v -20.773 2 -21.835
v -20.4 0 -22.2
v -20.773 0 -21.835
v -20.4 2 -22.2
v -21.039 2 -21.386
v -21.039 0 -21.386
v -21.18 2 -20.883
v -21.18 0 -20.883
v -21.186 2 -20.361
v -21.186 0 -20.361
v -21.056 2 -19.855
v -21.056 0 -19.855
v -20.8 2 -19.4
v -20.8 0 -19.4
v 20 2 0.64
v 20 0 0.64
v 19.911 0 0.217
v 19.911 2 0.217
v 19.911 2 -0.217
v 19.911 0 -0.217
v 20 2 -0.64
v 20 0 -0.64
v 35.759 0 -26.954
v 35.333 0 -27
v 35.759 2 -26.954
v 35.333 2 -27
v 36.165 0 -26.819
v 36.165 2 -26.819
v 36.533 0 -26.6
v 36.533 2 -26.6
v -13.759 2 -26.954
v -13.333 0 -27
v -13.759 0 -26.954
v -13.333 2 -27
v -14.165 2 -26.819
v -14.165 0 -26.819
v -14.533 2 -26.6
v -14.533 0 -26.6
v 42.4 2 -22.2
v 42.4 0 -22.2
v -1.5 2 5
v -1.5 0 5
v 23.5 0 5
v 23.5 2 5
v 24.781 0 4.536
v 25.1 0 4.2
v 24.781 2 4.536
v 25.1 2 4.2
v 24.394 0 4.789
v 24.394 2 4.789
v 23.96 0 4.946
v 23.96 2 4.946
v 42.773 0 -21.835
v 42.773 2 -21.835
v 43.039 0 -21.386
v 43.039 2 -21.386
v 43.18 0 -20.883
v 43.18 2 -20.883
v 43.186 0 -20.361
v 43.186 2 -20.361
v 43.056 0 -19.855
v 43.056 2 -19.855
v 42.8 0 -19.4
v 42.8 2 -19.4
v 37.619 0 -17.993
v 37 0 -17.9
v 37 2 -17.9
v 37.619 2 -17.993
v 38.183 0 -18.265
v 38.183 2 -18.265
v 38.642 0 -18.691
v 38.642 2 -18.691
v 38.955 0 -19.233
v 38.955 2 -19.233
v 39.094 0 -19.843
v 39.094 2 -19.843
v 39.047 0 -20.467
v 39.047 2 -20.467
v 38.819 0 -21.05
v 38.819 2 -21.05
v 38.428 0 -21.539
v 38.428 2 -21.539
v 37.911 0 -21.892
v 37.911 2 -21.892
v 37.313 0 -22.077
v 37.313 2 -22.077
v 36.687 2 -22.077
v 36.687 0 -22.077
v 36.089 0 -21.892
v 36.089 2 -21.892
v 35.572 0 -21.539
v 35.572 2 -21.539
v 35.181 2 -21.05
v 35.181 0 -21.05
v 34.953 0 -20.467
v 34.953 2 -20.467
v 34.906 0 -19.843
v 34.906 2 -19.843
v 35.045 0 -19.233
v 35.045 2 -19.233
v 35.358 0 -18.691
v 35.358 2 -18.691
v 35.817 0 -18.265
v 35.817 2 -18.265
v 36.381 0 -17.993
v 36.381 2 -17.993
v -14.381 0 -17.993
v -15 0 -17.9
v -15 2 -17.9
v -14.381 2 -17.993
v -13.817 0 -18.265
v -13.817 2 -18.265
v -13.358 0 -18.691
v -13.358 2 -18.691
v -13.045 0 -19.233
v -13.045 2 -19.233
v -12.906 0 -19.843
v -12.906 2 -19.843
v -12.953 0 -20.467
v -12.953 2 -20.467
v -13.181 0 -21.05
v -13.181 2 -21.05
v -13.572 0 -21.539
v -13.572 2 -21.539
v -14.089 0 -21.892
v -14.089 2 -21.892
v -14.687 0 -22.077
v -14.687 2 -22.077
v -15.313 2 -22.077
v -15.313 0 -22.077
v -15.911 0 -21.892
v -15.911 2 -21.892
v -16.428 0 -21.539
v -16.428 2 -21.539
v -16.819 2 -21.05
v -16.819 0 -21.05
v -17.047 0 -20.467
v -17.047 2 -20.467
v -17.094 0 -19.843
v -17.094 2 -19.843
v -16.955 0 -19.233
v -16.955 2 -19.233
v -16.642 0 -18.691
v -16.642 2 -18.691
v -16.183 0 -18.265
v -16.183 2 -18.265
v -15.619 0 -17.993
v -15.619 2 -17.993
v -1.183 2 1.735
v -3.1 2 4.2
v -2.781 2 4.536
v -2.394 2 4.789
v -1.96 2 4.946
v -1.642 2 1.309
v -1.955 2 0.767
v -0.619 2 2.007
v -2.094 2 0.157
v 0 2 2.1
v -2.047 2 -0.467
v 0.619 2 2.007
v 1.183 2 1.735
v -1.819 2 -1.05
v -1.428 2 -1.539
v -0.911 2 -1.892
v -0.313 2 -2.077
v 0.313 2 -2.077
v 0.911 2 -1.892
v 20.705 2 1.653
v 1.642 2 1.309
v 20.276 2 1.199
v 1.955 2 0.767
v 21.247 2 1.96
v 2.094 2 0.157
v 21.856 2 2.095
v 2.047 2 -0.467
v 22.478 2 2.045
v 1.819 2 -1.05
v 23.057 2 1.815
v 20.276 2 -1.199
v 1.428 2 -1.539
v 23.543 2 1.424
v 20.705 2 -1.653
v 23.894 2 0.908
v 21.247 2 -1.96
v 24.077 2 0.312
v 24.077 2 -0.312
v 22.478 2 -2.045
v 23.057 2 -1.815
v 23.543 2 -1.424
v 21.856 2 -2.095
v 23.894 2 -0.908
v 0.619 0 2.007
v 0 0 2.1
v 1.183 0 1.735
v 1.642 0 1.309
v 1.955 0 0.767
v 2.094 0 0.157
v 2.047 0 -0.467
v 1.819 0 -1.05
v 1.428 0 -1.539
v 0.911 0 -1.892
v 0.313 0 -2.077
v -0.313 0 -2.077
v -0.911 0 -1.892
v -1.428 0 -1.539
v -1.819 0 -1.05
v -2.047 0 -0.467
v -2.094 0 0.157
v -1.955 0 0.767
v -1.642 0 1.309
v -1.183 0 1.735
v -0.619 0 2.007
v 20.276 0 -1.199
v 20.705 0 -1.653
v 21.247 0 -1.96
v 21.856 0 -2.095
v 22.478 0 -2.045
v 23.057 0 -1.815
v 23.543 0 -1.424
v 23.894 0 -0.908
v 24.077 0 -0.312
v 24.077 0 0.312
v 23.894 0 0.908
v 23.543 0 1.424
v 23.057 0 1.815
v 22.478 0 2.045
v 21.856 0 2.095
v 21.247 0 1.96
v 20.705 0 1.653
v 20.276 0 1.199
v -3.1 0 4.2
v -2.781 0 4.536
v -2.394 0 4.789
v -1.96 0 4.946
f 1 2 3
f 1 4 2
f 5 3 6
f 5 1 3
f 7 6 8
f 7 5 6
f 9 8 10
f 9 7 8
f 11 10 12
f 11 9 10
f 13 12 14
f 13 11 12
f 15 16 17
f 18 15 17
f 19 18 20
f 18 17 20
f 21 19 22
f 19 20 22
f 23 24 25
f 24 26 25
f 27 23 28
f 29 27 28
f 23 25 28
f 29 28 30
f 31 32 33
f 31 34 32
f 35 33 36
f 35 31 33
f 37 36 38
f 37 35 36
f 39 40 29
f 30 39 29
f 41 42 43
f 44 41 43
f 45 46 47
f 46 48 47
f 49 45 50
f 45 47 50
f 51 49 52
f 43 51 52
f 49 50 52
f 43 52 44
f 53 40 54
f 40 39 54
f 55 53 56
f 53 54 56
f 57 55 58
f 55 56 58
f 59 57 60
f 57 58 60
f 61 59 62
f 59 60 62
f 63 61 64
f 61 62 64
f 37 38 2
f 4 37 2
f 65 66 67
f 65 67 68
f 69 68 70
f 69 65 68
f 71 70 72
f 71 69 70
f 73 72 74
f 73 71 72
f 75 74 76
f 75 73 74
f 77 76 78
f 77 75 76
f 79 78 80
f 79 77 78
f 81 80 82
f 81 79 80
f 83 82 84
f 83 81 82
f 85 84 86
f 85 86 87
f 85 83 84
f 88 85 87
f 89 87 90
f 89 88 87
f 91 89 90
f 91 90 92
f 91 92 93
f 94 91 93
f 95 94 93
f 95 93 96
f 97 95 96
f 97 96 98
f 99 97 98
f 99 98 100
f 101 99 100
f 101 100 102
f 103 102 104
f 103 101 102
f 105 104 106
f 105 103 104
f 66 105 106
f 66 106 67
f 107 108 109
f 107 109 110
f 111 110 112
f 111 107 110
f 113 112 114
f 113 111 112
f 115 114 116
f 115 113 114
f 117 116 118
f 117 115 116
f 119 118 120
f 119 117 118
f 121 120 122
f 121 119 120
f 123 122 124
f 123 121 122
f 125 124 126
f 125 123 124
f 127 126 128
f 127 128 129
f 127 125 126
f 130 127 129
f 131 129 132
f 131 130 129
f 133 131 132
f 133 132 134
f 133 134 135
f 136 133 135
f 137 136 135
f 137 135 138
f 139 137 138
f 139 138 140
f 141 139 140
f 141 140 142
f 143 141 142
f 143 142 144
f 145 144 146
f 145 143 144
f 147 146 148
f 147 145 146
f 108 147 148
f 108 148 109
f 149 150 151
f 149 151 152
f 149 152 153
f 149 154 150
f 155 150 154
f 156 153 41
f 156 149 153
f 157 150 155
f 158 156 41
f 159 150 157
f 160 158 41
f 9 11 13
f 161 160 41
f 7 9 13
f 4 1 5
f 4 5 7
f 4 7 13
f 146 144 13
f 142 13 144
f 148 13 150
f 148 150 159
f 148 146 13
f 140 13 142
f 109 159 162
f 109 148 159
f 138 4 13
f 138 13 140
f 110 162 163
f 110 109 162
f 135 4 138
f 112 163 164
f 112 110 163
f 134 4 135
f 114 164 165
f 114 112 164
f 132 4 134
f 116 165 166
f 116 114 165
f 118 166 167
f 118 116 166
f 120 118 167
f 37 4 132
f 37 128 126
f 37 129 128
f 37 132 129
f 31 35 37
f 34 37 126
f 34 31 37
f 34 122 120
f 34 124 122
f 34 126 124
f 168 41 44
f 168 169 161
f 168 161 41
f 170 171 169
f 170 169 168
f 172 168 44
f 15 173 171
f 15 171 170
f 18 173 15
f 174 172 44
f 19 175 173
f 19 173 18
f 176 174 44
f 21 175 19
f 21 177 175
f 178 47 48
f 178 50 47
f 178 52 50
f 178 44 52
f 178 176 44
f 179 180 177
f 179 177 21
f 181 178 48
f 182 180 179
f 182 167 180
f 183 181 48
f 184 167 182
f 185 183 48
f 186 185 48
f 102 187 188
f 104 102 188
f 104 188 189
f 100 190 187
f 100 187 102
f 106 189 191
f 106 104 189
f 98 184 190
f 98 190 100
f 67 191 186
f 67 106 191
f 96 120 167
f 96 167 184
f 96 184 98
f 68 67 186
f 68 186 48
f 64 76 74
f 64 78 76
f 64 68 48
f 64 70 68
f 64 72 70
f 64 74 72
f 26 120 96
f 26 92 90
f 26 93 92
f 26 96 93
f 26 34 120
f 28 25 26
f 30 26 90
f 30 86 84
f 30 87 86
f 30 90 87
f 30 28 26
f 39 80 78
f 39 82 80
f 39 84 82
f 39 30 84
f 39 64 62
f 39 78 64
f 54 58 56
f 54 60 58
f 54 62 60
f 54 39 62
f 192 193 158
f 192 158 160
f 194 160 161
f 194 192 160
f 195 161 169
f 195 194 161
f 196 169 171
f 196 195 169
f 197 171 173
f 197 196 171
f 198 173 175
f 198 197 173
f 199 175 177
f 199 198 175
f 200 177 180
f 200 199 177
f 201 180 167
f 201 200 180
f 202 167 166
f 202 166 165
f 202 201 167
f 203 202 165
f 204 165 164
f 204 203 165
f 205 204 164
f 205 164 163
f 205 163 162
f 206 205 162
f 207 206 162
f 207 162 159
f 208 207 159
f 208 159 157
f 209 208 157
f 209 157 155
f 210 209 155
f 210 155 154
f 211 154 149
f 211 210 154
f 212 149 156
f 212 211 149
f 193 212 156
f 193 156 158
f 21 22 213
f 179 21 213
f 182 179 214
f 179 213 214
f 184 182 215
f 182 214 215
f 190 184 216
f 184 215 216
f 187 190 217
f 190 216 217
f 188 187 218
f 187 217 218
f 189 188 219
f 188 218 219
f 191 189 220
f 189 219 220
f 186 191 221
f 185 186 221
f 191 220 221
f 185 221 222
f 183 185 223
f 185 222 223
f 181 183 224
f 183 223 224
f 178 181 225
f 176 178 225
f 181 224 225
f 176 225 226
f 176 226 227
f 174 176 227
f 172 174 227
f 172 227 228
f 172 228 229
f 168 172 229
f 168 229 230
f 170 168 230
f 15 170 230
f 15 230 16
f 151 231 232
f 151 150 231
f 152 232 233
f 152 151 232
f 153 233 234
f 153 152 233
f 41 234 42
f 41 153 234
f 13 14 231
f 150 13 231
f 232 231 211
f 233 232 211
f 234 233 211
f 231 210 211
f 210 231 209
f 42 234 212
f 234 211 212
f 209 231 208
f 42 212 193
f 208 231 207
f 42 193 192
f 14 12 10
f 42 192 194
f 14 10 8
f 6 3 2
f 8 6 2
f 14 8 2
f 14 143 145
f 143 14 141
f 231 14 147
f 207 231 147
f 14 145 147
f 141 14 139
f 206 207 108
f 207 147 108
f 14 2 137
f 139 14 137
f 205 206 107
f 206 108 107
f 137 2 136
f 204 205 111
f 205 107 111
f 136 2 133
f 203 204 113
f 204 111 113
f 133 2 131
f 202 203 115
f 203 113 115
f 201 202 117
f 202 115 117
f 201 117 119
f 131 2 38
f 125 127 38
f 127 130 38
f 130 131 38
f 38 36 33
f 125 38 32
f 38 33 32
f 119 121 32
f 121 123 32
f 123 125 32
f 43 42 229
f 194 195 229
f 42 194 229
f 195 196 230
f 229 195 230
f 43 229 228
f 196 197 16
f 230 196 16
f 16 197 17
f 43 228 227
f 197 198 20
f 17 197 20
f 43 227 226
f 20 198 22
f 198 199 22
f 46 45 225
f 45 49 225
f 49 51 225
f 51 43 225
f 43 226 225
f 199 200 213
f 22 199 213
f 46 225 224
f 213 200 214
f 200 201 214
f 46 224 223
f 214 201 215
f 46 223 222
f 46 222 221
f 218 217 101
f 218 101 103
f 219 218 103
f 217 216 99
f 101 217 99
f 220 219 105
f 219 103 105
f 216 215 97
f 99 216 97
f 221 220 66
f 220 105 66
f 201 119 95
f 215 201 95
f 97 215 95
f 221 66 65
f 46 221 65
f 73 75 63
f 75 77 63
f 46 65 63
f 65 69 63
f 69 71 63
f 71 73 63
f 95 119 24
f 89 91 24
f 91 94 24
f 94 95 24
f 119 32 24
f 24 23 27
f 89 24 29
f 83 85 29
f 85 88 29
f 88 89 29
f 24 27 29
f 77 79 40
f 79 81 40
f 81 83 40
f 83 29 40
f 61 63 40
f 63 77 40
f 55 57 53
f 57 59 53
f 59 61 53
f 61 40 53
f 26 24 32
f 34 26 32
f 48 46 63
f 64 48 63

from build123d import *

# Parameters (mm, degrees)
SKETCH_1_R      = 2.1
EXTRUDE_2_DEPTH = 2
FILLET_1_R      = 2


with BuildPart() as part:
    # ｽｹｯﾁ1 → ﾎﾞｽ - 押し出し2 (new body)
    with BuildSketch(Plane(origin=(0, 0, 0), x_dir=(1, 0, 0), z_dir=(0, 1, 0))):
        Polygon((36, 27), (-14, 27), (-22, 21), (-2.5, -5), (1.666666667, -5), (20, -5), (24.5, -5), (44, 21), align=None)
        with Locations(Location((0, 0, 0), (0, 0, 270))):
            Circle(SKETCH_1_R, mode=Mode.SUBTRACT)
        with BuildLine():
            ThreePointArc((20, -0.640312424), (19.9, 0), (20, 0.640312424))
            ThreePointArc((20, 0.640312424), (24.1, 0), (20, -0.640312424))
        make_face(mode=Mode.SUBTRACT)
        with Locations(Location((-15, 20, 0), (0, 0, 270))):
            Circle(SKETCH_1_R, mode=Mode.SUBTRACT)
        with Locations(Location((37, 20, 0), (0, 0, 270))):
            Circle(SKETCH_1_R, mode=Mode.SUBTRACT)
    extrude(amount=EXTRUDE_2_DEPTH)

    # ﾌｨﾚｯﾄ1
    fillet_1_edges = [part.edges().sort_by_distance(p)[0] for p in [
        (-22, 1, -21),
        (-14, 1, -27),
        (36, 1, -27),
        (44, 1, -21),
        (24.5, 1, 5),
        (-2.5, 1, 5),
    ]]
    fillet(fillet_1_edges, radius=FILLET_1_R)


solid = part.part
